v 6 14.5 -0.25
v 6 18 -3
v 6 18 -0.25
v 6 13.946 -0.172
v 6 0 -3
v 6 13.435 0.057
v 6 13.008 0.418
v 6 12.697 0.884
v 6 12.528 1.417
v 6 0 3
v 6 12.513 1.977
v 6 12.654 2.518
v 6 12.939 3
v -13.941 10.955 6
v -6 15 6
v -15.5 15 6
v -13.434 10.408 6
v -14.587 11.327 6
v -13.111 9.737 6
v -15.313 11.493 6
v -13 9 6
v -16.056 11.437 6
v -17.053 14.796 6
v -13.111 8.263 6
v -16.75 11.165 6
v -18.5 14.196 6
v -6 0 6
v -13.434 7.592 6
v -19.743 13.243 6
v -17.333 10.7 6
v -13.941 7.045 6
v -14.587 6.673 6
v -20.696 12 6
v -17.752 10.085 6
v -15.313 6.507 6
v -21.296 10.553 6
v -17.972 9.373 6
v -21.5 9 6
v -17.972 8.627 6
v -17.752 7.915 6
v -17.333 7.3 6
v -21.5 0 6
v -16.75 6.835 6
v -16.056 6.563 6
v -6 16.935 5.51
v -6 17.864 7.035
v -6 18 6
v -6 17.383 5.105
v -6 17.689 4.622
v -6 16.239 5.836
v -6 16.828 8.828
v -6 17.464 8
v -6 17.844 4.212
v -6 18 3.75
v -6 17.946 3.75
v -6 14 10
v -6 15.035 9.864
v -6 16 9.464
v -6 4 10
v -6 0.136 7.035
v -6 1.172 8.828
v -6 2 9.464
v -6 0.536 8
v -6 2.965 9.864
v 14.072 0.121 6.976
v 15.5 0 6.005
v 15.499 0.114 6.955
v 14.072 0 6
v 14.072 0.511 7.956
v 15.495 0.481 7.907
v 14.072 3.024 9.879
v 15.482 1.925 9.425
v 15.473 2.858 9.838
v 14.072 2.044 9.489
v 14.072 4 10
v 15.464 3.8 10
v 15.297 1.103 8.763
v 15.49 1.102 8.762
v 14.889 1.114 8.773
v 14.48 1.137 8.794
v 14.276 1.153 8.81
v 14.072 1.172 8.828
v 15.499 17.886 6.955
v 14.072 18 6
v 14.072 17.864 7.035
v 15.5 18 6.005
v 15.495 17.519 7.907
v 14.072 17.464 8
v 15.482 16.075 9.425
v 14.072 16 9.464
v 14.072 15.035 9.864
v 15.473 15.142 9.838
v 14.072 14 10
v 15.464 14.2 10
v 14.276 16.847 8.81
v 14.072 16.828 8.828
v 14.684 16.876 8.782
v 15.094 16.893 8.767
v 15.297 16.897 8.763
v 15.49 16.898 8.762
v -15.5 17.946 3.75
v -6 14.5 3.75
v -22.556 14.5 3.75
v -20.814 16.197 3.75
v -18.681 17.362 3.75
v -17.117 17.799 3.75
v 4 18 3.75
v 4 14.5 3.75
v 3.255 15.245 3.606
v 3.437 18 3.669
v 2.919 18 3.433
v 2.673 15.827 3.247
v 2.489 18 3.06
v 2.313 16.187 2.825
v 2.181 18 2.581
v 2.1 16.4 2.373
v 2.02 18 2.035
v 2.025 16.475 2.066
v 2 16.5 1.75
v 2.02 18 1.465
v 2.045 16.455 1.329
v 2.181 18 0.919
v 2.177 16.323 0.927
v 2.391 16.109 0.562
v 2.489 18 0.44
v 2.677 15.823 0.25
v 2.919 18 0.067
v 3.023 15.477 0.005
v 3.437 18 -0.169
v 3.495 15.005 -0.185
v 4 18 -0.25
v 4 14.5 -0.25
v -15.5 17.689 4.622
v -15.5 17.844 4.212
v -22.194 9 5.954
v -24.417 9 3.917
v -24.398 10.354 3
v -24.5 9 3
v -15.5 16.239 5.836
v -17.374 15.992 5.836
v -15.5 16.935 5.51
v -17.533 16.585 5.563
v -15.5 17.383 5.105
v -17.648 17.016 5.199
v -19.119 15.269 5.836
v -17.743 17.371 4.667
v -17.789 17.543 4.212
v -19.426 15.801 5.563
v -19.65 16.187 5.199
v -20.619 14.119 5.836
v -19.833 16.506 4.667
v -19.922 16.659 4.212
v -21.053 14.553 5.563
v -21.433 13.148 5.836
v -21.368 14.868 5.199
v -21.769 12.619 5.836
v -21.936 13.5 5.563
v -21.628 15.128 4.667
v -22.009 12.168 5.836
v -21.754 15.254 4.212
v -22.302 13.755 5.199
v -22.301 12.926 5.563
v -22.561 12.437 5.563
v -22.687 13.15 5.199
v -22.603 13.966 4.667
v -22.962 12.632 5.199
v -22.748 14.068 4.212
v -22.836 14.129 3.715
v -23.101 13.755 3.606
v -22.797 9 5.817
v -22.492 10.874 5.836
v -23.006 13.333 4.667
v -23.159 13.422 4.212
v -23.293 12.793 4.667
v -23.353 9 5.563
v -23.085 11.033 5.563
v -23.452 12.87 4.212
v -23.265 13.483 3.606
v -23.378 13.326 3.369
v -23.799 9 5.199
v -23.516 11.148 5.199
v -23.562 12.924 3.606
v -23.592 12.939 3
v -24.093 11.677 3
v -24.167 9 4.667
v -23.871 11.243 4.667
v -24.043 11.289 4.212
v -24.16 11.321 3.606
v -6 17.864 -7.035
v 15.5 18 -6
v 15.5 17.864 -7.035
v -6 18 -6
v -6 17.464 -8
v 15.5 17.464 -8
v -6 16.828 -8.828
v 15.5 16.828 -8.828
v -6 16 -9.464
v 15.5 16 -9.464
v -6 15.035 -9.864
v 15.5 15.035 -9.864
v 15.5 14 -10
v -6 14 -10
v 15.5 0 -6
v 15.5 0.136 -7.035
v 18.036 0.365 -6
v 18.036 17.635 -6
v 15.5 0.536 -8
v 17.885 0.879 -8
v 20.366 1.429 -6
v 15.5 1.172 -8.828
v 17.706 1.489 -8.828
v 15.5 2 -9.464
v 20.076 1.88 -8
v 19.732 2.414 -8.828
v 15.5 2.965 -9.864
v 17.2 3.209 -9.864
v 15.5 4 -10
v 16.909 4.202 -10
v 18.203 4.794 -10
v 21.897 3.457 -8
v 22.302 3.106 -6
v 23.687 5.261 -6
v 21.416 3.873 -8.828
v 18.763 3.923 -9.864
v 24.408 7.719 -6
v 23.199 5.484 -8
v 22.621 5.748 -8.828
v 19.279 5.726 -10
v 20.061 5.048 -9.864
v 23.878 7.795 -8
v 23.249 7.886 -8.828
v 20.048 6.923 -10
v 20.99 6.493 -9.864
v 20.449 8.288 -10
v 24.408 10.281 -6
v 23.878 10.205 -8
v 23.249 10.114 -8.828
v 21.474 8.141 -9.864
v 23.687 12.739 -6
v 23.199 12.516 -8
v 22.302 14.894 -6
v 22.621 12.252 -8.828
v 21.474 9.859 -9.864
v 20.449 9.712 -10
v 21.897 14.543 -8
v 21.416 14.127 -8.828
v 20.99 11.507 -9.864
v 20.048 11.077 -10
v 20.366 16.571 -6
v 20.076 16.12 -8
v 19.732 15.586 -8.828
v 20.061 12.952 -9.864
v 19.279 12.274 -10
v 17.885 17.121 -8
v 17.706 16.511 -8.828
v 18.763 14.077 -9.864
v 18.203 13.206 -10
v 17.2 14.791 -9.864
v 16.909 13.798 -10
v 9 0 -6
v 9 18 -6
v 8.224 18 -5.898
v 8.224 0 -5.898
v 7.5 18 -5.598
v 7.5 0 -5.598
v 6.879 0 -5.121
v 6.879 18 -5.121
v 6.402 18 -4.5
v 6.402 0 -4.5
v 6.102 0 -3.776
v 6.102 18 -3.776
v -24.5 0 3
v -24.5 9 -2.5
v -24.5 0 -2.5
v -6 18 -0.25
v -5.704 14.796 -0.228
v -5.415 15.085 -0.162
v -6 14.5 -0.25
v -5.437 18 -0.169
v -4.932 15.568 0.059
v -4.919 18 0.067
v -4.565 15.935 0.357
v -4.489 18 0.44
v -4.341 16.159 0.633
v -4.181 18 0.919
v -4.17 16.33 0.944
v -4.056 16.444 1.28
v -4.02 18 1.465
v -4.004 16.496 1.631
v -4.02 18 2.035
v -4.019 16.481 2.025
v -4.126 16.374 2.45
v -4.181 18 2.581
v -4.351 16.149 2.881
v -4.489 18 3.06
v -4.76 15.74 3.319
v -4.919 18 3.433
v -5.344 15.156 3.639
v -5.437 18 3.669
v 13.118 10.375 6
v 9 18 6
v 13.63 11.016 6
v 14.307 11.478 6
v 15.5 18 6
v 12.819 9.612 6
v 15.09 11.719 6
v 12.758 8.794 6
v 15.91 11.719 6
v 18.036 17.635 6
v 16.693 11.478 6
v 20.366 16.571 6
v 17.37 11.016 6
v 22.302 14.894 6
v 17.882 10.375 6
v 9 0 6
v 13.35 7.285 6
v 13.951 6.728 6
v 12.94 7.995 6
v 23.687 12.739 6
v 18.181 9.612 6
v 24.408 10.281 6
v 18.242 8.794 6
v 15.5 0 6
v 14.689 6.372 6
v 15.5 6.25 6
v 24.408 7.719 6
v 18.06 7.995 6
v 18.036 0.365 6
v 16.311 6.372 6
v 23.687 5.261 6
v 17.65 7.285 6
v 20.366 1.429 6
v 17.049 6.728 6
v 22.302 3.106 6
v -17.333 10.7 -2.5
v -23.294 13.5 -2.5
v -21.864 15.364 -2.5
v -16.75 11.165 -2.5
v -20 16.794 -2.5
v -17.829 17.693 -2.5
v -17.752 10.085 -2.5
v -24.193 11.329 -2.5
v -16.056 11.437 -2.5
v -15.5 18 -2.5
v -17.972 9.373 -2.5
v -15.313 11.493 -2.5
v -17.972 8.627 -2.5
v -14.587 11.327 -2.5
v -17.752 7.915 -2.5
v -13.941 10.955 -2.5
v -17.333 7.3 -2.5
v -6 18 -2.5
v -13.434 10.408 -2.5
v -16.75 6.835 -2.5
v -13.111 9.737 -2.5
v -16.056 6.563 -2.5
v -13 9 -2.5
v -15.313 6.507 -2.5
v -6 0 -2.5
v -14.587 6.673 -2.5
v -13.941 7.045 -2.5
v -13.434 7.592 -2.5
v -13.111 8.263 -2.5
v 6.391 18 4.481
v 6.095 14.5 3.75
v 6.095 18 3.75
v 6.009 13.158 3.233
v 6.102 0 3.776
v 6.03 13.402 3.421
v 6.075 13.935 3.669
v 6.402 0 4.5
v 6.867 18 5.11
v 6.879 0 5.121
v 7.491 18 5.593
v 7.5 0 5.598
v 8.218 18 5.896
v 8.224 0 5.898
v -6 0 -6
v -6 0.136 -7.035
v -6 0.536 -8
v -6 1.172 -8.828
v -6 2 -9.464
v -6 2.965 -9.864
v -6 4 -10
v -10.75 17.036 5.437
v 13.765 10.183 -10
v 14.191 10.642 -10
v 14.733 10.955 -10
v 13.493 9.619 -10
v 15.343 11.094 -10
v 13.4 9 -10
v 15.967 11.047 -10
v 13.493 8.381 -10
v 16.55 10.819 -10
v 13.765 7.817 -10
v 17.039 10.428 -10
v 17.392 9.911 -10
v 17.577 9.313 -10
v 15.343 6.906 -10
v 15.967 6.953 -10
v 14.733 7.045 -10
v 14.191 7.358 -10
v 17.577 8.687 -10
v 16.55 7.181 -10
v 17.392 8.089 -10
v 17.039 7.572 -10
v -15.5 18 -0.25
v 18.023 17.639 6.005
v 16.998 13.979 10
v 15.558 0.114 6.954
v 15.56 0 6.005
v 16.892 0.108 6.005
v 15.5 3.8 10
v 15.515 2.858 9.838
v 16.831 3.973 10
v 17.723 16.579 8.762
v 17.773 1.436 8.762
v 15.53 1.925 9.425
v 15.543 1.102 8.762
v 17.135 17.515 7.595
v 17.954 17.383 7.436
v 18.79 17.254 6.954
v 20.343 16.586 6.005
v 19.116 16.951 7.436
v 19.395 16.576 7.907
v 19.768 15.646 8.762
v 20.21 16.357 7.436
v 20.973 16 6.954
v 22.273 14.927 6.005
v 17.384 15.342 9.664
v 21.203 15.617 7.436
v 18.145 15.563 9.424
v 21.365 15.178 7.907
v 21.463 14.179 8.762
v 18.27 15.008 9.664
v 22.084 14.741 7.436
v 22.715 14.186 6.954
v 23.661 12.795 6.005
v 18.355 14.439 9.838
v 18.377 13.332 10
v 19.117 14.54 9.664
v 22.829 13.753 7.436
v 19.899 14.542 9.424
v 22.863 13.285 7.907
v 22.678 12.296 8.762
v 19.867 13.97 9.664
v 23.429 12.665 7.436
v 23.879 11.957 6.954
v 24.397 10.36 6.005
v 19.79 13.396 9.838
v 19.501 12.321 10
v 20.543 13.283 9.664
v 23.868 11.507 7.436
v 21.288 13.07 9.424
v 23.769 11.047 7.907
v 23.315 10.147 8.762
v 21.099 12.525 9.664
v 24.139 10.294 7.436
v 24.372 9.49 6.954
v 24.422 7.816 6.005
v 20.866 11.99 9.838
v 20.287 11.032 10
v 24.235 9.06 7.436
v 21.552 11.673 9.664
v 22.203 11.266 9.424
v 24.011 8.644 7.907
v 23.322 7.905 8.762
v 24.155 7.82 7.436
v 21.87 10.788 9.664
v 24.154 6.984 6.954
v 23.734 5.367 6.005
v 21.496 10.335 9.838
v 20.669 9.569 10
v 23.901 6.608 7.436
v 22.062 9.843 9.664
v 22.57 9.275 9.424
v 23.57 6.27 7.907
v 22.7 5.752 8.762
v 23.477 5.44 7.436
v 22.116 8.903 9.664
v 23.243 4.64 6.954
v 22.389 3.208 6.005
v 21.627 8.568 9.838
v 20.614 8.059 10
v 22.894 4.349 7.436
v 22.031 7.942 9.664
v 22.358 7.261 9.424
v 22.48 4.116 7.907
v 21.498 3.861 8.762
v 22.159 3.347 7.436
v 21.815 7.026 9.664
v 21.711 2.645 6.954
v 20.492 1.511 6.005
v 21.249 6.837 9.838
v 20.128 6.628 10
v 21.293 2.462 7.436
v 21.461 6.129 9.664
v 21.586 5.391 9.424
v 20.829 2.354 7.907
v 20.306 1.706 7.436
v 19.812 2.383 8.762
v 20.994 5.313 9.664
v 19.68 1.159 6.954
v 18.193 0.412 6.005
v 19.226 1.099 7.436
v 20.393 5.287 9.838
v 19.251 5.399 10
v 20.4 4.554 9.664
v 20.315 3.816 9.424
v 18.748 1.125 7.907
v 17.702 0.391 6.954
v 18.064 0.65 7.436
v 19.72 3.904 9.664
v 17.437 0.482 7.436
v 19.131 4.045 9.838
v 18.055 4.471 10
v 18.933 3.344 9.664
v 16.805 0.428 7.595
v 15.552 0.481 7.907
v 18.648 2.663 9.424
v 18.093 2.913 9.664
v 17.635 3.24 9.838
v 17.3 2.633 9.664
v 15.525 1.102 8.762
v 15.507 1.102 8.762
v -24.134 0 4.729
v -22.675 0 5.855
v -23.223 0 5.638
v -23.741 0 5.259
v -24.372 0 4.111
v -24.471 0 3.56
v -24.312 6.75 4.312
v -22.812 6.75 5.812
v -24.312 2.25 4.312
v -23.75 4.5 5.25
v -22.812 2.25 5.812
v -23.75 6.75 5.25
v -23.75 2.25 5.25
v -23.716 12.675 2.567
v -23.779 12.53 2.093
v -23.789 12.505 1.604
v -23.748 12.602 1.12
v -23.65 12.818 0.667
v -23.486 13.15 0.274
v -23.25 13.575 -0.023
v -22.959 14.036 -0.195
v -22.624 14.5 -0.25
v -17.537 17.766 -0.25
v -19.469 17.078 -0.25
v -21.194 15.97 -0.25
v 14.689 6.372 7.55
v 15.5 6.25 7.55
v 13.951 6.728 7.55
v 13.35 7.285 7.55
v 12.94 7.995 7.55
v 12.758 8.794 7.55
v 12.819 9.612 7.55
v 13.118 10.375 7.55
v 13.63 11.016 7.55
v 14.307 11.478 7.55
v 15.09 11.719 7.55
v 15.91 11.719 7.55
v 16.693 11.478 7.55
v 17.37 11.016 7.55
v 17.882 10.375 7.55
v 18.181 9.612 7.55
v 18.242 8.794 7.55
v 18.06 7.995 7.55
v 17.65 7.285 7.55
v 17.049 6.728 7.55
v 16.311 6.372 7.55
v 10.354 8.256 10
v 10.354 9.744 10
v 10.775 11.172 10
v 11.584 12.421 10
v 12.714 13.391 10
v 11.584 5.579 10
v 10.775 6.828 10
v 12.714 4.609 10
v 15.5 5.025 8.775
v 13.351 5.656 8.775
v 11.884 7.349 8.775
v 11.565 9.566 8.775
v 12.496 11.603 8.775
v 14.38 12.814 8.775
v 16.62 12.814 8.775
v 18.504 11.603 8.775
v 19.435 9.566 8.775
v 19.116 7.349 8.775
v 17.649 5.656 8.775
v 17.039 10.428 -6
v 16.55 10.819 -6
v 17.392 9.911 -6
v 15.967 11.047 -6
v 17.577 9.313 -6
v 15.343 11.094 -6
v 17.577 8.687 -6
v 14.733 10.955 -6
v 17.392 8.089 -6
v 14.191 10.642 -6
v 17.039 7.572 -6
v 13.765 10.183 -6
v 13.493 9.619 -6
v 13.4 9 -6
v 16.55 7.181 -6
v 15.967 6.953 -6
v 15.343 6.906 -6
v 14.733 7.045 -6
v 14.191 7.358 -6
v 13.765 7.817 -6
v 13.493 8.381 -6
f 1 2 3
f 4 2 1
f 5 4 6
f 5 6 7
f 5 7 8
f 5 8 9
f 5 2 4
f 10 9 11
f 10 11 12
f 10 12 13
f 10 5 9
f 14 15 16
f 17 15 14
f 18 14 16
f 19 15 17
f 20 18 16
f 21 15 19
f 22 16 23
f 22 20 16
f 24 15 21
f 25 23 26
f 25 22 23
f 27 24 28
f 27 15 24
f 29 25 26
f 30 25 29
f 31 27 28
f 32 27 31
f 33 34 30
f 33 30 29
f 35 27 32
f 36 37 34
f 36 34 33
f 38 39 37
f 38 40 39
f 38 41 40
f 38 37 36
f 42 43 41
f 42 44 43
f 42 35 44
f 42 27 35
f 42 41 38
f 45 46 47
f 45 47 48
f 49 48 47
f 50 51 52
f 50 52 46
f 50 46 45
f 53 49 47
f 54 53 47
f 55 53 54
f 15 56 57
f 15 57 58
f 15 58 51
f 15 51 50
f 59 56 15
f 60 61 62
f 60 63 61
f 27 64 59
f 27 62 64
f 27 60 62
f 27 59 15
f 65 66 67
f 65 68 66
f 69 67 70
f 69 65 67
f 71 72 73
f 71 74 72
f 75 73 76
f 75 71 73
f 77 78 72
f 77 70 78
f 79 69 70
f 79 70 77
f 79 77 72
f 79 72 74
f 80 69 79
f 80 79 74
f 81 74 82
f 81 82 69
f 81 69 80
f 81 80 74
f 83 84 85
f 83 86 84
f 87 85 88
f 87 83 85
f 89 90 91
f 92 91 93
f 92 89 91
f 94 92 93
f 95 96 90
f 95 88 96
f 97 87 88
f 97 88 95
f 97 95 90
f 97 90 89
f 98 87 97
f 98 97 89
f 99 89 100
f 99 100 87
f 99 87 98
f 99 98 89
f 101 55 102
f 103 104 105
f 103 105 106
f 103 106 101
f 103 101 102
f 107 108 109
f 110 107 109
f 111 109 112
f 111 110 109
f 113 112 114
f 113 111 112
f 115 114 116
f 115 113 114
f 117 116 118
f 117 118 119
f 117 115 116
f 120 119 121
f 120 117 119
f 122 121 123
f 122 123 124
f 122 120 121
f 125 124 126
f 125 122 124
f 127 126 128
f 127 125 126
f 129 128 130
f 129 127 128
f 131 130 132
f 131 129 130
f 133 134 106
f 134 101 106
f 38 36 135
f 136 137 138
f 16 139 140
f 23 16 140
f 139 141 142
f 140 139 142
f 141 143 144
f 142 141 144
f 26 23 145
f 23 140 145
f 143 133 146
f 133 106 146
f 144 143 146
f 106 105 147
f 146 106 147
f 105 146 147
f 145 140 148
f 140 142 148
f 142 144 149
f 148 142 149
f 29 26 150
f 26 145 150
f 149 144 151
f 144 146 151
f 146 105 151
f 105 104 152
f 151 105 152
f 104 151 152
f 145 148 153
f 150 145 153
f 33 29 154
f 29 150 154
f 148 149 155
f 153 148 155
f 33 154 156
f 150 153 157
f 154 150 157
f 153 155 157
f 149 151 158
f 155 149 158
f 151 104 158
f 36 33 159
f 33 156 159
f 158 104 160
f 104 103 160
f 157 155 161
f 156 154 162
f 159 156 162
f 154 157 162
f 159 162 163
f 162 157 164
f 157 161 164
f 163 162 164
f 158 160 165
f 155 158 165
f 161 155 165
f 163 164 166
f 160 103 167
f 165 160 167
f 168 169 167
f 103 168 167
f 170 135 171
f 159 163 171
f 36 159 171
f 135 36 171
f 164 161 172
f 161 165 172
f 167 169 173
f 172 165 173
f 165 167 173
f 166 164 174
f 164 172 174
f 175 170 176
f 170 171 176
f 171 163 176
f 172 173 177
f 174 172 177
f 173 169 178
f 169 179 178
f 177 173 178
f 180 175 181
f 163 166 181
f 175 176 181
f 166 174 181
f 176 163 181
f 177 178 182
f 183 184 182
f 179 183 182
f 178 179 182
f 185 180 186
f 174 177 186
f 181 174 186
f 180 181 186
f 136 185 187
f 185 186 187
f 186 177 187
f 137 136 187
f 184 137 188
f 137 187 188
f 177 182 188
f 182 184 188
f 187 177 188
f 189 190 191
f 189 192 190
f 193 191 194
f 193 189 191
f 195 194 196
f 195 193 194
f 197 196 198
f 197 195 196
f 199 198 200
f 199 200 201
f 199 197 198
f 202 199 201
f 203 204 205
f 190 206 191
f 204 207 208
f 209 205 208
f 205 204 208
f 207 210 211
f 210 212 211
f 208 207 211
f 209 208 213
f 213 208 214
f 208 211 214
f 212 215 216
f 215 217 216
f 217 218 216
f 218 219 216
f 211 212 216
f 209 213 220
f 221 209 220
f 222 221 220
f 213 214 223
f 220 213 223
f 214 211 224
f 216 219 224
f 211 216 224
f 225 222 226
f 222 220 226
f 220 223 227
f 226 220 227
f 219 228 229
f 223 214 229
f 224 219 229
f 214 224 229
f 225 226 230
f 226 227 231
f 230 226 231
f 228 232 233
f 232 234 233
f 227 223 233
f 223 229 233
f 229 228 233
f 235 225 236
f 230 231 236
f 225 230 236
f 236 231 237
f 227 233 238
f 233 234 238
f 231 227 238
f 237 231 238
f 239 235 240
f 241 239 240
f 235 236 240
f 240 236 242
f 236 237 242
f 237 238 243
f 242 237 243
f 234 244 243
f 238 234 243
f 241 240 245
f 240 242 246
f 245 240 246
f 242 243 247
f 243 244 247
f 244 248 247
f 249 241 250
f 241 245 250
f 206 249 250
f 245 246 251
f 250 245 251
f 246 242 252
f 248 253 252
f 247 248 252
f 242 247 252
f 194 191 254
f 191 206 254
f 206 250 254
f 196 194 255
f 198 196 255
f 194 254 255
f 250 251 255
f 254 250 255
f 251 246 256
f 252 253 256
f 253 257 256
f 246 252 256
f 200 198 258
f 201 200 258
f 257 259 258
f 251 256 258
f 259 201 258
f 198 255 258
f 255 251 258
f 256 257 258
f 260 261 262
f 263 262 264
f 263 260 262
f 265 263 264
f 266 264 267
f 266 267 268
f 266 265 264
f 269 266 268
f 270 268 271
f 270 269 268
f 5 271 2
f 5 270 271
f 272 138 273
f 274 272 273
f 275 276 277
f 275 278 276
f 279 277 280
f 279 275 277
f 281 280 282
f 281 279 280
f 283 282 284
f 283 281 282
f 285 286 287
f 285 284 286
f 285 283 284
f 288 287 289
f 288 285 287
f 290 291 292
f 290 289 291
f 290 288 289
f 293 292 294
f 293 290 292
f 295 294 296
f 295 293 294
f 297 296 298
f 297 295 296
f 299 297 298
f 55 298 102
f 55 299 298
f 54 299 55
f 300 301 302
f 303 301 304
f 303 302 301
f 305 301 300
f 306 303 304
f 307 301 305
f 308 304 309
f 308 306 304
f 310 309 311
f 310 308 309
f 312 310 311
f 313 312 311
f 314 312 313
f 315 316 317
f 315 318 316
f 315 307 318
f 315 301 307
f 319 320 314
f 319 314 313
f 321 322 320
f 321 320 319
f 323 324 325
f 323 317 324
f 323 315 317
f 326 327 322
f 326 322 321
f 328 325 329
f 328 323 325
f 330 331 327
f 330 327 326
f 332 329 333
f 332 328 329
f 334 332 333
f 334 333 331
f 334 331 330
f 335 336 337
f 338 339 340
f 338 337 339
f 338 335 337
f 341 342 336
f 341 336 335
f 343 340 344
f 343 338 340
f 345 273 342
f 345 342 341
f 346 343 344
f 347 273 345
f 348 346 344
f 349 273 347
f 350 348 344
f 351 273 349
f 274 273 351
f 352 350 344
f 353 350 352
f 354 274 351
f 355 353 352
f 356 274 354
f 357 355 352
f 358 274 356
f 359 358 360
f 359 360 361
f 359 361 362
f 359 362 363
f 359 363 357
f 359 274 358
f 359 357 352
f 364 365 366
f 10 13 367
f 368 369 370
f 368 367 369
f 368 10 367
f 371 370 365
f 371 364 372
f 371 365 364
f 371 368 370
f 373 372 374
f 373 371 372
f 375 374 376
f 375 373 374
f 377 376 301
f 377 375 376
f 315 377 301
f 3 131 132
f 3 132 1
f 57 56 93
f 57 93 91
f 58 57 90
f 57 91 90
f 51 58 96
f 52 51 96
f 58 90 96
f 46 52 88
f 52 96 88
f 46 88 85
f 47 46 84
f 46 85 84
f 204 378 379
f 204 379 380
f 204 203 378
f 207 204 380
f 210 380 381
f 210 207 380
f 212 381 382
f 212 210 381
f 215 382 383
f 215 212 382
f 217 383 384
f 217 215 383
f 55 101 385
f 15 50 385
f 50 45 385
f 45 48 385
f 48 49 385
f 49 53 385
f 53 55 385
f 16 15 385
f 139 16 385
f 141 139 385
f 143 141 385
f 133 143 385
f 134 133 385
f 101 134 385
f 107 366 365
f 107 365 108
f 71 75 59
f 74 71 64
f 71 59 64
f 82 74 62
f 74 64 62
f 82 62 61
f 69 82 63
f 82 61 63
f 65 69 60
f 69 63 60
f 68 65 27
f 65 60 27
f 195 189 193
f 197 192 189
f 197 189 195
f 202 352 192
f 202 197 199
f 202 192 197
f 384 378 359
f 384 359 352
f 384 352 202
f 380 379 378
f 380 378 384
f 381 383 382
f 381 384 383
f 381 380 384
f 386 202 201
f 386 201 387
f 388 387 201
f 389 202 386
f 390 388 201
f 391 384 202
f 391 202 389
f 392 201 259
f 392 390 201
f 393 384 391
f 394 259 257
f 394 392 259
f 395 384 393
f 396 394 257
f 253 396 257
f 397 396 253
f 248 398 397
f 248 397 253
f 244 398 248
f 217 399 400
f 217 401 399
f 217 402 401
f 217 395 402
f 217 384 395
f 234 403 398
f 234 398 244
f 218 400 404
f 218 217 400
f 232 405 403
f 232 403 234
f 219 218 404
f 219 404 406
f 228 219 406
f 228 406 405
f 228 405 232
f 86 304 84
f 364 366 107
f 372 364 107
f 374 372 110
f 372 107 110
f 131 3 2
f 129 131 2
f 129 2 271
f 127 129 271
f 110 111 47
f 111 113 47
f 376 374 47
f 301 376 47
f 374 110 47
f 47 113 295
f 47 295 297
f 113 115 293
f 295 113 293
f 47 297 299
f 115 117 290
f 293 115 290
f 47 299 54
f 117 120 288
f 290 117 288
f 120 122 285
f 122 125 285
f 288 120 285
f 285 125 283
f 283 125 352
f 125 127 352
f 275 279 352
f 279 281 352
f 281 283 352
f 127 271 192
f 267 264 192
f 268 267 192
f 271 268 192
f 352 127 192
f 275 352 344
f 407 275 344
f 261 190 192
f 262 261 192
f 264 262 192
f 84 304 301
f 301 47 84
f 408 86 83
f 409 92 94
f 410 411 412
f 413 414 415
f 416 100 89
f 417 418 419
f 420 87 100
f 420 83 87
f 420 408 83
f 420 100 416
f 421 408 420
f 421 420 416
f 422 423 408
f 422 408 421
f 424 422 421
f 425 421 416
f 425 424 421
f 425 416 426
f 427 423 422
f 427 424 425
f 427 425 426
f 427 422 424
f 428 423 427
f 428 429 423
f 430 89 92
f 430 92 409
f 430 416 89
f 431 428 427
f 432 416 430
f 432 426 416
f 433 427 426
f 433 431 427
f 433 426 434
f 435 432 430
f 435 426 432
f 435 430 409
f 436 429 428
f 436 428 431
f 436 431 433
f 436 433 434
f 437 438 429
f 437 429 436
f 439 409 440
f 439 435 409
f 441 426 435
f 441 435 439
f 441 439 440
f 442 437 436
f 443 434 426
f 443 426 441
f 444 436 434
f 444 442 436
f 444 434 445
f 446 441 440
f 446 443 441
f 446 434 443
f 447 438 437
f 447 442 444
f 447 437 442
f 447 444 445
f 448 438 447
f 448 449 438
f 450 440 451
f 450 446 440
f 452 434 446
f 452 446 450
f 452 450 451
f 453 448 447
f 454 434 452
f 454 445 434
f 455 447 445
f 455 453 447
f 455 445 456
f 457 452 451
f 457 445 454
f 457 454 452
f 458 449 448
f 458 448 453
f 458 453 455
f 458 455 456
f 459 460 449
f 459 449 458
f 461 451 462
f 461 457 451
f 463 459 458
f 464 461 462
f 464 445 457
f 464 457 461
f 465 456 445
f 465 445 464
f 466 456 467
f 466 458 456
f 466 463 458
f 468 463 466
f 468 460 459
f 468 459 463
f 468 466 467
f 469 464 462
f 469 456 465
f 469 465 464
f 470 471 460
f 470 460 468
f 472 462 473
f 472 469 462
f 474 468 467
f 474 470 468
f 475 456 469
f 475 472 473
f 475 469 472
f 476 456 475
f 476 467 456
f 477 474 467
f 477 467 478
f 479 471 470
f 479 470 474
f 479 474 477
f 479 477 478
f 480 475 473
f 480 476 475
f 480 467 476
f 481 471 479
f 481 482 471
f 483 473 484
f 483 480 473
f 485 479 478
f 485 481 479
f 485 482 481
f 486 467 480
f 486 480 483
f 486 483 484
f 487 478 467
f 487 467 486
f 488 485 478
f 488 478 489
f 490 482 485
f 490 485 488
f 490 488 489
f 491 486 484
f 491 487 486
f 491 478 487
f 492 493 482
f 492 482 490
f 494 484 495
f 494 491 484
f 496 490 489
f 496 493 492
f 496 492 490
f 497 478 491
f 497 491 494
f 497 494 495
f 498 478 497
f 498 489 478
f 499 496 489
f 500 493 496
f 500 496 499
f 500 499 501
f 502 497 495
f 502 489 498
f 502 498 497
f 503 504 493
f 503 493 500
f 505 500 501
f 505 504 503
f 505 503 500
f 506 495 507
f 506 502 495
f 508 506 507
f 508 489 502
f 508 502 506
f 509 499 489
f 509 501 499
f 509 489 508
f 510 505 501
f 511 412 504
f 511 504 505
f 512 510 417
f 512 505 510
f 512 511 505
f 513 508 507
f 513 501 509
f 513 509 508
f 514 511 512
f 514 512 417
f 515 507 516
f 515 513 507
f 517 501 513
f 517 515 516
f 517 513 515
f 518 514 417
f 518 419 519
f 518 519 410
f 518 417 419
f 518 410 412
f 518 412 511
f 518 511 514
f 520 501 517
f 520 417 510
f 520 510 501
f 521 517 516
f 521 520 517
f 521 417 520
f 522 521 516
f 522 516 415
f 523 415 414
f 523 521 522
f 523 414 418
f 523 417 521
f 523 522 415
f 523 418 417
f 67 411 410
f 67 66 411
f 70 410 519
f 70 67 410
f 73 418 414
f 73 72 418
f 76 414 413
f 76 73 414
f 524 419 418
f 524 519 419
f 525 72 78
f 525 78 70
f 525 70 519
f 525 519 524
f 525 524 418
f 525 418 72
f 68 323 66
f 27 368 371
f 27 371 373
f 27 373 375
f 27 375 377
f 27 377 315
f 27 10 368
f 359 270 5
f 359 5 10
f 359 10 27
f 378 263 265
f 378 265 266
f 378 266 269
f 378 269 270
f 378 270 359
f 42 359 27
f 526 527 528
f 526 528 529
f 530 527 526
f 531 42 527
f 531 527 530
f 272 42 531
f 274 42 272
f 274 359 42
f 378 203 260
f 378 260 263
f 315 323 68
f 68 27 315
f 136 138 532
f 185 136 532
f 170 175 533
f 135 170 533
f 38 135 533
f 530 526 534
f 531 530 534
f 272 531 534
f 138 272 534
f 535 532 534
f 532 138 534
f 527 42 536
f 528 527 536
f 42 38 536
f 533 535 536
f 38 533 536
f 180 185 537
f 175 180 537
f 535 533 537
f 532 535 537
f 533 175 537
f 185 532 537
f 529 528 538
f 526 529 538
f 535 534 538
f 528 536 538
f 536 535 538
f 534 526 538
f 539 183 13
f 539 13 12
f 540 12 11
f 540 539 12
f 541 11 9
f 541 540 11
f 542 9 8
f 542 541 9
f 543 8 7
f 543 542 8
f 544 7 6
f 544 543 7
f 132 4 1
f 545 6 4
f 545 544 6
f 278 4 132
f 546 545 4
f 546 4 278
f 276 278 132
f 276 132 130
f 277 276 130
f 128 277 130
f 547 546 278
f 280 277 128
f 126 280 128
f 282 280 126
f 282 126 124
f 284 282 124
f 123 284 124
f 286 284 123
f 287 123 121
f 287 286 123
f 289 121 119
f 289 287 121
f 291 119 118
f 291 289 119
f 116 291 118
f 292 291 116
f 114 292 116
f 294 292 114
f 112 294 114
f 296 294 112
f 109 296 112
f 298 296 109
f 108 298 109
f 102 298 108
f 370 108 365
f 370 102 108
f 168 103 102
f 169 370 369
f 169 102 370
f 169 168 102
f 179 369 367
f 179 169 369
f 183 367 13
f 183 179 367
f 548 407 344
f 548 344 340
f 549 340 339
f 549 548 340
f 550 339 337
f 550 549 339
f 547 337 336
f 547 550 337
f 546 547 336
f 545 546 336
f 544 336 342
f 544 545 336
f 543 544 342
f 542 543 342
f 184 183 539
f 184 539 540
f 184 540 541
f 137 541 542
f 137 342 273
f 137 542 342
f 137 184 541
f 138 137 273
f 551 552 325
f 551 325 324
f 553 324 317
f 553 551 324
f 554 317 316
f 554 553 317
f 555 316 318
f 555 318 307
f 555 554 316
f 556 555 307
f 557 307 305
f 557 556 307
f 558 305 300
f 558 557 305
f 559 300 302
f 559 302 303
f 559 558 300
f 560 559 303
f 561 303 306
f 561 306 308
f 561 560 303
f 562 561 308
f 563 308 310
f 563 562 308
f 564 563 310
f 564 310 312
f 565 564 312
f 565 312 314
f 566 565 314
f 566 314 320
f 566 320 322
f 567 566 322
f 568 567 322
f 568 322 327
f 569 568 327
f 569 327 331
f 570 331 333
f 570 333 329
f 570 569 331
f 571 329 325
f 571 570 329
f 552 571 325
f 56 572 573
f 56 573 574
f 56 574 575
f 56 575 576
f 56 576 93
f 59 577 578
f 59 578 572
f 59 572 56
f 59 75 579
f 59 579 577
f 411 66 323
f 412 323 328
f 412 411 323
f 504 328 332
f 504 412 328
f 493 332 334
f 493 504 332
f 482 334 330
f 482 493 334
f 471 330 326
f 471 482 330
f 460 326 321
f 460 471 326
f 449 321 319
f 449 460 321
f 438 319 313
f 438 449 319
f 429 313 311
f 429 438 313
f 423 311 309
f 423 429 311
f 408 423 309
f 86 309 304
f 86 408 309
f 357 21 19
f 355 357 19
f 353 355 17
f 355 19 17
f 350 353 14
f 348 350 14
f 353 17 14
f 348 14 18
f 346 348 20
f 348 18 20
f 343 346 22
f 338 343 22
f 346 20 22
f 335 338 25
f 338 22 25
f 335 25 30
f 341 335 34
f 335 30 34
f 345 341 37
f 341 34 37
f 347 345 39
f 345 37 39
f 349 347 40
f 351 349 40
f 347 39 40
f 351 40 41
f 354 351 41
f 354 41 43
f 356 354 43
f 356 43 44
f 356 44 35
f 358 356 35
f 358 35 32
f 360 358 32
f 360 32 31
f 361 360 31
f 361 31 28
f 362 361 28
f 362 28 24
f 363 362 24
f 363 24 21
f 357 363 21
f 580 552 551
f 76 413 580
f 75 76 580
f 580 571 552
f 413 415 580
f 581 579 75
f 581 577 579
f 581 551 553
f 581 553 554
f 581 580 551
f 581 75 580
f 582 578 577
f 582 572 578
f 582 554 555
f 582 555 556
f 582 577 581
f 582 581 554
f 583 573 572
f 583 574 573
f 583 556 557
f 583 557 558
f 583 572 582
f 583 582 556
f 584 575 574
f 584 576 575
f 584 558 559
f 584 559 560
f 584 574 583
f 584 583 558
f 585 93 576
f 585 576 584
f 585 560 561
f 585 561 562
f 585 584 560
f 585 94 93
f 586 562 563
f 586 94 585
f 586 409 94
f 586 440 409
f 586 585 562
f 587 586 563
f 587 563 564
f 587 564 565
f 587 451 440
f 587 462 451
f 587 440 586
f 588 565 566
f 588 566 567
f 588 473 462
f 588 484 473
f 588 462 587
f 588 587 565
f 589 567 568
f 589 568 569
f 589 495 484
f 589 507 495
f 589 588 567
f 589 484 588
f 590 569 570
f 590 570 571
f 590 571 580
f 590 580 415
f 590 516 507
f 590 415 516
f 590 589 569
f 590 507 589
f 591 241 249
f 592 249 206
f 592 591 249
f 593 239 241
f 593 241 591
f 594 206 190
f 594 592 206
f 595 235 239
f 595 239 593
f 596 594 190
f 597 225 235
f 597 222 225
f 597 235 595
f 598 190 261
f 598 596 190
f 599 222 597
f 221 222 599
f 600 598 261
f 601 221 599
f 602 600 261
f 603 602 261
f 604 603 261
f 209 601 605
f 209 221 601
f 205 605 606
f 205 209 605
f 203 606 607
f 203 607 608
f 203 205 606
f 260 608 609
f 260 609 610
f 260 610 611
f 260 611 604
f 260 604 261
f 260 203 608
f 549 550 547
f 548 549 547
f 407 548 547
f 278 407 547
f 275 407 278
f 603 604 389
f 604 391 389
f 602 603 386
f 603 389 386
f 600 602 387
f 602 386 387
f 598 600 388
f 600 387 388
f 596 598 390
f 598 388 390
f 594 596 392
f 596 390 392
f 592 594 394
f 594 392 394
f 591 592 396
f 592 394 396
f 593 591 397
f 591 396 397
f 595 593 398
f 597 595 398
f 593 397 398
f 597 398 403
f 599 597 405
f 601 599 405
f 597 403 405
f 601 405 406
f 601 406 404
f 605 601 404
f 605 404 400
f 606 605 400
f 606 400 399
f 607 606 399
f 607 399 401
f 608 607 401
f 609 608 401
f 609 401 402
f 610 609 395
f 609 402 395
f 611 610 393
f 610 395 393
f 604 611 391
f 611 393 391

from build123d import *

# Parameters (mm, degrees)
BOSS_EXTRUDE1_DEPTH         = 18
SKETCH5_OUTSIDE_W           = 62.18
SKETCH5_OUTSIDE_H           = 31.18
SKETCH5_OUTSIDE_R           = 2.5
CUT_EXTRUDE1_DEPTH          = 20
M5_TAPPED_HOLE1_D           = 4.2
M5_TAPPED_HOLE1_CSINK_D     = 10.4
M5_TAPPED_HOLE1_CSINK_ANGLE = 90
FILLET1_R                   = 4
FILLET2_R                   = 4
FILLET3_SIZE                = 3
CUT_EXTRUDE2_DEPTH          = 37.800136028
CUT_EXTRUDE2_DEPTH_BACK     = 37.800136028
SKETCH12_R                  = 2
CUT_EXTRUDE3_DEPTH          = 3.5
CUT_EXTRUDE4_DEPTH          = 3.5


# Some blends are built 0.0001 mm under size
with BuildPart() as part:
    # Sketch2 → Boss-Extrude1 (new body)
    with BuildSketch(Plane(origin=(0, 0, 0), x_dir=(1, 0, 0), z_dir=(0, 1, 0))):
        with BuildLine():
            Line((-6, 10), (24.5, 10))
            Line((24.5, 10), (24.5, 6))
            Line((24.5, 6), (9, 6))
            ThreePointArc((9, 6), (6.878679656, 5.121320344), (6, 3))
            Line((6, 3), (6, -3))
            ThreePointArc((6, -3), (6.878679656, -5.121320344), (9, -6))
            Line((9, -6), (24.5, -6))
            Line((24.5, -6), (24.5, -10))
            Line((24.5, -10), (-6, -10))
            Line((-6, -10), (-6, -6))
            Line((-6, -6), (-24.5, -6))
            Line((-24.5, -6), (-24.5, 2.5))
            Line((-24.5, 2.5), (-6, 2.5))
            Line((-6, 2.5), (-6, 10))
        make_face()
    extrude(amount=BOSS_EXTRUDE1_DEPTH)

    # Sketch5 outside → Cut-Extrude1 (cut)
    # profile 1 of 2: a face of its own
    with BuildSketch(Plane.XY.offset(10)):
        with Locations((0, 9)):
            Rectangle(SKETCH5_OUTSIDE_W, SKETCH5_OUTSIDE_H)
        with BuildLine():
            Line((-24.5, 9), (-24.5, 0))
            Line((-24.5, 0), (15.5, 0))
            ThreePointArc((15.5, 0), (24.5, 9), (15.5, 18))
            Line((15.5, 18), (-15.5, 18))
            ThreePointArc((-15.5, 18), (-21.863961031, 15.363961031), (-24.5, 9))
        make_face(mode=Mode.SUBTRACT)
    # profile 2 of 2: a face of its own
    with BuildSketch(Plane.XY.offset(10)):
        with Locations((-15.5, 9)):
            Circle(SKETCH5_OUTSIDE_R)
    extrude(amount=-CUT_EXTRUDE1_DEPTH, mode=Mode.SUBTRACT)

    # Sketch8 → CSK for M5 Countersunk Flat Head Screw1 (revolve, cut)
    with BuildSketch(Plane(origin=(15.5, 9, 10), x_dir=(0, -1, 0), z_dir=(1, 0, 0))):
        Polygon((0, 0), (0, 4), (2.75, 4), (2.75, 2.45), (5.2, 0), align=None)
    revolve(axis=Axis((15.5, 9, 16.35), (0, 0, -1)), mode=Mode.SUBTRACT)

    # M5 Tapped Hole1 (through all)
    with Locations(Plane.XY.offset(10)):
        with Locations((15.5, 9)):
            CounterSinkHole(M5_TAPPED_HOLE1_D / 2, M5_TAPPED_HOLE1_CSINK_D / 2, counter_sink_angle=M5_TAPPED_HOLE1_CSINK_ANGLE)

    # Fillet1
    fillet1_edges = [part.edges().sort_by_distance(p)[0] for p in [
        (4.75, 0, 10),
        (4.75, 18, 10),
    ]]
    fillet(fillet1_edges, radius=FILLET1_R - 0.0001)  # a hair under: the kernel refuses the full size

    # Fillet2
    fillet2_edges = [part.edges().sort_by_distance(p)[0] for p in [
        (4.75, 0, -10),
        (24.5, 9, -10),
        (4.75, 18, -10),
    ]]
    fillet(fillet2_edges, radius=FILLET2_R - 0.0001)  # a hair under: the kernel refuses the full size

    # Fillet3
    # a fillet whose section is not a circle: 3 mm, written as the material it takes off along each edge
    with BuildSketch(Plane(origin=(-24.5, -7.5, 6), x_dir=(0, 0, -1), z_dir=(0, 1, 0))) as fillet3_piece_1:
        with BuildLine():
            Bezier((FILLET3_SIZE, 0), (0, 0), (0, -FILLET3_SIZE), weights=[1, 1, 1])
            Line((0, -FILLET3_SIZE), (0, 0))
            Line((0, 0), (FILLET3_SIZE, 0))
        make_face()
    extrude(amount=16.5, mode=Mode.SUBTRACT)
    with BuildSketch(Plane(origin=(-6, 18, 6), x_dir=(0, -1, 0), z_dir=(-1, 0, 0))) as fillet3_piece_2:
        with BuildLine():
            Bezier((FILLET3_SIZE, 0), (0, 0), (0, -FILLET3_SIZE), weights=[1, 1, 1])
            Line((0, -FILLET3_SIZE), (0, 0))
            Line((0, 0), (FILLET3_SIZE, 0))
        make_face()
    extrude(amount=9.5, mode=Mode.SUBTRACT)
    with BuildSketch(Plane(origin=(-15.5, 9, 6), x_dir=(0, 1, 0), z_dir=(1, 0, 0))) as fillet3_piece_3:
        with BuildLine():
            Bezier((9 - FILLET3_SIZE, 0), (9, 0), (9, -FILLET3_SIZE), weights=[1, 1, 1])
            Line((9, -FILLET3_SIZE), (9, 0))
            Line((9, 0), (9 - FILLET3_SIZE, 0))
        make_face()
    revolve(axis=Axis((-15.5, 9, 6), (0, 0, 1)), revolution_arc=90, mode=Mode.SUBTRACT)

    # Sketch12 → Cut-Extrude2 (cut, two sides: drawn at the far end of the back side and taken through both)
    with BuildSketch(Plane(origin=(6, 0, 0), x_dir=(0, 0, -1), z_dir=(1, 0, 0)).offset(-CUT_EXTRUDE2_DEPTH_BACK)):
        with Locations(Location((-1.75, 14.5, 0), (0, 0, 231.317812547))):
            Circle(SKETCH12_R)
    extrude(amount=CUT_EXTRUDE2_DEPTH + CUT_EXTRUDE2_DEPTH_BACK, mode=Mode.SUBTRACT)

    # Sketch13 → Cut-Extrude3 (cut)
    with BuildSketch(Plane(origin=(0, 18, 0), x_dir=(1, 0, 0), z_dir=(0, 1, 0))):
        with BuildLine():
            Line((-24, 0.25), (-6, 0.25))
            ThreePointArc((-6, 0.25), (-4, -1.75), (-6, -3.75))
            Line((-6, -3.75), (-24, -3.75))
            Line((-24, -3.75), (-24, 0.25))
        make_face()
    extrude(amount=-CUT_EXTRUDE3_DEPTH, mode=Mode.SUBTRACT)

    # Sketch15 → Cut-Extrude4 (cut)
    with BuildSketch(Plane(origin=(0, 18, 0), x_dir=(1, 0, 0), z_dir=(0, 1, 0))):
        with BuildLine():
            Line((4, 0.25), (9, 0.25))
            Line((9, 0.25), (9, -3.75))
            Line((9, -3.75), (4, -3.75))
            ThreePointArc((4, -3.75), (2, -1.75), (4, 0.25))
        make_face()
    extrude(amount=-CUT_EXTRUDE4_DEPTH, mode=Mode.SUBTRACT)


solid = part.part
